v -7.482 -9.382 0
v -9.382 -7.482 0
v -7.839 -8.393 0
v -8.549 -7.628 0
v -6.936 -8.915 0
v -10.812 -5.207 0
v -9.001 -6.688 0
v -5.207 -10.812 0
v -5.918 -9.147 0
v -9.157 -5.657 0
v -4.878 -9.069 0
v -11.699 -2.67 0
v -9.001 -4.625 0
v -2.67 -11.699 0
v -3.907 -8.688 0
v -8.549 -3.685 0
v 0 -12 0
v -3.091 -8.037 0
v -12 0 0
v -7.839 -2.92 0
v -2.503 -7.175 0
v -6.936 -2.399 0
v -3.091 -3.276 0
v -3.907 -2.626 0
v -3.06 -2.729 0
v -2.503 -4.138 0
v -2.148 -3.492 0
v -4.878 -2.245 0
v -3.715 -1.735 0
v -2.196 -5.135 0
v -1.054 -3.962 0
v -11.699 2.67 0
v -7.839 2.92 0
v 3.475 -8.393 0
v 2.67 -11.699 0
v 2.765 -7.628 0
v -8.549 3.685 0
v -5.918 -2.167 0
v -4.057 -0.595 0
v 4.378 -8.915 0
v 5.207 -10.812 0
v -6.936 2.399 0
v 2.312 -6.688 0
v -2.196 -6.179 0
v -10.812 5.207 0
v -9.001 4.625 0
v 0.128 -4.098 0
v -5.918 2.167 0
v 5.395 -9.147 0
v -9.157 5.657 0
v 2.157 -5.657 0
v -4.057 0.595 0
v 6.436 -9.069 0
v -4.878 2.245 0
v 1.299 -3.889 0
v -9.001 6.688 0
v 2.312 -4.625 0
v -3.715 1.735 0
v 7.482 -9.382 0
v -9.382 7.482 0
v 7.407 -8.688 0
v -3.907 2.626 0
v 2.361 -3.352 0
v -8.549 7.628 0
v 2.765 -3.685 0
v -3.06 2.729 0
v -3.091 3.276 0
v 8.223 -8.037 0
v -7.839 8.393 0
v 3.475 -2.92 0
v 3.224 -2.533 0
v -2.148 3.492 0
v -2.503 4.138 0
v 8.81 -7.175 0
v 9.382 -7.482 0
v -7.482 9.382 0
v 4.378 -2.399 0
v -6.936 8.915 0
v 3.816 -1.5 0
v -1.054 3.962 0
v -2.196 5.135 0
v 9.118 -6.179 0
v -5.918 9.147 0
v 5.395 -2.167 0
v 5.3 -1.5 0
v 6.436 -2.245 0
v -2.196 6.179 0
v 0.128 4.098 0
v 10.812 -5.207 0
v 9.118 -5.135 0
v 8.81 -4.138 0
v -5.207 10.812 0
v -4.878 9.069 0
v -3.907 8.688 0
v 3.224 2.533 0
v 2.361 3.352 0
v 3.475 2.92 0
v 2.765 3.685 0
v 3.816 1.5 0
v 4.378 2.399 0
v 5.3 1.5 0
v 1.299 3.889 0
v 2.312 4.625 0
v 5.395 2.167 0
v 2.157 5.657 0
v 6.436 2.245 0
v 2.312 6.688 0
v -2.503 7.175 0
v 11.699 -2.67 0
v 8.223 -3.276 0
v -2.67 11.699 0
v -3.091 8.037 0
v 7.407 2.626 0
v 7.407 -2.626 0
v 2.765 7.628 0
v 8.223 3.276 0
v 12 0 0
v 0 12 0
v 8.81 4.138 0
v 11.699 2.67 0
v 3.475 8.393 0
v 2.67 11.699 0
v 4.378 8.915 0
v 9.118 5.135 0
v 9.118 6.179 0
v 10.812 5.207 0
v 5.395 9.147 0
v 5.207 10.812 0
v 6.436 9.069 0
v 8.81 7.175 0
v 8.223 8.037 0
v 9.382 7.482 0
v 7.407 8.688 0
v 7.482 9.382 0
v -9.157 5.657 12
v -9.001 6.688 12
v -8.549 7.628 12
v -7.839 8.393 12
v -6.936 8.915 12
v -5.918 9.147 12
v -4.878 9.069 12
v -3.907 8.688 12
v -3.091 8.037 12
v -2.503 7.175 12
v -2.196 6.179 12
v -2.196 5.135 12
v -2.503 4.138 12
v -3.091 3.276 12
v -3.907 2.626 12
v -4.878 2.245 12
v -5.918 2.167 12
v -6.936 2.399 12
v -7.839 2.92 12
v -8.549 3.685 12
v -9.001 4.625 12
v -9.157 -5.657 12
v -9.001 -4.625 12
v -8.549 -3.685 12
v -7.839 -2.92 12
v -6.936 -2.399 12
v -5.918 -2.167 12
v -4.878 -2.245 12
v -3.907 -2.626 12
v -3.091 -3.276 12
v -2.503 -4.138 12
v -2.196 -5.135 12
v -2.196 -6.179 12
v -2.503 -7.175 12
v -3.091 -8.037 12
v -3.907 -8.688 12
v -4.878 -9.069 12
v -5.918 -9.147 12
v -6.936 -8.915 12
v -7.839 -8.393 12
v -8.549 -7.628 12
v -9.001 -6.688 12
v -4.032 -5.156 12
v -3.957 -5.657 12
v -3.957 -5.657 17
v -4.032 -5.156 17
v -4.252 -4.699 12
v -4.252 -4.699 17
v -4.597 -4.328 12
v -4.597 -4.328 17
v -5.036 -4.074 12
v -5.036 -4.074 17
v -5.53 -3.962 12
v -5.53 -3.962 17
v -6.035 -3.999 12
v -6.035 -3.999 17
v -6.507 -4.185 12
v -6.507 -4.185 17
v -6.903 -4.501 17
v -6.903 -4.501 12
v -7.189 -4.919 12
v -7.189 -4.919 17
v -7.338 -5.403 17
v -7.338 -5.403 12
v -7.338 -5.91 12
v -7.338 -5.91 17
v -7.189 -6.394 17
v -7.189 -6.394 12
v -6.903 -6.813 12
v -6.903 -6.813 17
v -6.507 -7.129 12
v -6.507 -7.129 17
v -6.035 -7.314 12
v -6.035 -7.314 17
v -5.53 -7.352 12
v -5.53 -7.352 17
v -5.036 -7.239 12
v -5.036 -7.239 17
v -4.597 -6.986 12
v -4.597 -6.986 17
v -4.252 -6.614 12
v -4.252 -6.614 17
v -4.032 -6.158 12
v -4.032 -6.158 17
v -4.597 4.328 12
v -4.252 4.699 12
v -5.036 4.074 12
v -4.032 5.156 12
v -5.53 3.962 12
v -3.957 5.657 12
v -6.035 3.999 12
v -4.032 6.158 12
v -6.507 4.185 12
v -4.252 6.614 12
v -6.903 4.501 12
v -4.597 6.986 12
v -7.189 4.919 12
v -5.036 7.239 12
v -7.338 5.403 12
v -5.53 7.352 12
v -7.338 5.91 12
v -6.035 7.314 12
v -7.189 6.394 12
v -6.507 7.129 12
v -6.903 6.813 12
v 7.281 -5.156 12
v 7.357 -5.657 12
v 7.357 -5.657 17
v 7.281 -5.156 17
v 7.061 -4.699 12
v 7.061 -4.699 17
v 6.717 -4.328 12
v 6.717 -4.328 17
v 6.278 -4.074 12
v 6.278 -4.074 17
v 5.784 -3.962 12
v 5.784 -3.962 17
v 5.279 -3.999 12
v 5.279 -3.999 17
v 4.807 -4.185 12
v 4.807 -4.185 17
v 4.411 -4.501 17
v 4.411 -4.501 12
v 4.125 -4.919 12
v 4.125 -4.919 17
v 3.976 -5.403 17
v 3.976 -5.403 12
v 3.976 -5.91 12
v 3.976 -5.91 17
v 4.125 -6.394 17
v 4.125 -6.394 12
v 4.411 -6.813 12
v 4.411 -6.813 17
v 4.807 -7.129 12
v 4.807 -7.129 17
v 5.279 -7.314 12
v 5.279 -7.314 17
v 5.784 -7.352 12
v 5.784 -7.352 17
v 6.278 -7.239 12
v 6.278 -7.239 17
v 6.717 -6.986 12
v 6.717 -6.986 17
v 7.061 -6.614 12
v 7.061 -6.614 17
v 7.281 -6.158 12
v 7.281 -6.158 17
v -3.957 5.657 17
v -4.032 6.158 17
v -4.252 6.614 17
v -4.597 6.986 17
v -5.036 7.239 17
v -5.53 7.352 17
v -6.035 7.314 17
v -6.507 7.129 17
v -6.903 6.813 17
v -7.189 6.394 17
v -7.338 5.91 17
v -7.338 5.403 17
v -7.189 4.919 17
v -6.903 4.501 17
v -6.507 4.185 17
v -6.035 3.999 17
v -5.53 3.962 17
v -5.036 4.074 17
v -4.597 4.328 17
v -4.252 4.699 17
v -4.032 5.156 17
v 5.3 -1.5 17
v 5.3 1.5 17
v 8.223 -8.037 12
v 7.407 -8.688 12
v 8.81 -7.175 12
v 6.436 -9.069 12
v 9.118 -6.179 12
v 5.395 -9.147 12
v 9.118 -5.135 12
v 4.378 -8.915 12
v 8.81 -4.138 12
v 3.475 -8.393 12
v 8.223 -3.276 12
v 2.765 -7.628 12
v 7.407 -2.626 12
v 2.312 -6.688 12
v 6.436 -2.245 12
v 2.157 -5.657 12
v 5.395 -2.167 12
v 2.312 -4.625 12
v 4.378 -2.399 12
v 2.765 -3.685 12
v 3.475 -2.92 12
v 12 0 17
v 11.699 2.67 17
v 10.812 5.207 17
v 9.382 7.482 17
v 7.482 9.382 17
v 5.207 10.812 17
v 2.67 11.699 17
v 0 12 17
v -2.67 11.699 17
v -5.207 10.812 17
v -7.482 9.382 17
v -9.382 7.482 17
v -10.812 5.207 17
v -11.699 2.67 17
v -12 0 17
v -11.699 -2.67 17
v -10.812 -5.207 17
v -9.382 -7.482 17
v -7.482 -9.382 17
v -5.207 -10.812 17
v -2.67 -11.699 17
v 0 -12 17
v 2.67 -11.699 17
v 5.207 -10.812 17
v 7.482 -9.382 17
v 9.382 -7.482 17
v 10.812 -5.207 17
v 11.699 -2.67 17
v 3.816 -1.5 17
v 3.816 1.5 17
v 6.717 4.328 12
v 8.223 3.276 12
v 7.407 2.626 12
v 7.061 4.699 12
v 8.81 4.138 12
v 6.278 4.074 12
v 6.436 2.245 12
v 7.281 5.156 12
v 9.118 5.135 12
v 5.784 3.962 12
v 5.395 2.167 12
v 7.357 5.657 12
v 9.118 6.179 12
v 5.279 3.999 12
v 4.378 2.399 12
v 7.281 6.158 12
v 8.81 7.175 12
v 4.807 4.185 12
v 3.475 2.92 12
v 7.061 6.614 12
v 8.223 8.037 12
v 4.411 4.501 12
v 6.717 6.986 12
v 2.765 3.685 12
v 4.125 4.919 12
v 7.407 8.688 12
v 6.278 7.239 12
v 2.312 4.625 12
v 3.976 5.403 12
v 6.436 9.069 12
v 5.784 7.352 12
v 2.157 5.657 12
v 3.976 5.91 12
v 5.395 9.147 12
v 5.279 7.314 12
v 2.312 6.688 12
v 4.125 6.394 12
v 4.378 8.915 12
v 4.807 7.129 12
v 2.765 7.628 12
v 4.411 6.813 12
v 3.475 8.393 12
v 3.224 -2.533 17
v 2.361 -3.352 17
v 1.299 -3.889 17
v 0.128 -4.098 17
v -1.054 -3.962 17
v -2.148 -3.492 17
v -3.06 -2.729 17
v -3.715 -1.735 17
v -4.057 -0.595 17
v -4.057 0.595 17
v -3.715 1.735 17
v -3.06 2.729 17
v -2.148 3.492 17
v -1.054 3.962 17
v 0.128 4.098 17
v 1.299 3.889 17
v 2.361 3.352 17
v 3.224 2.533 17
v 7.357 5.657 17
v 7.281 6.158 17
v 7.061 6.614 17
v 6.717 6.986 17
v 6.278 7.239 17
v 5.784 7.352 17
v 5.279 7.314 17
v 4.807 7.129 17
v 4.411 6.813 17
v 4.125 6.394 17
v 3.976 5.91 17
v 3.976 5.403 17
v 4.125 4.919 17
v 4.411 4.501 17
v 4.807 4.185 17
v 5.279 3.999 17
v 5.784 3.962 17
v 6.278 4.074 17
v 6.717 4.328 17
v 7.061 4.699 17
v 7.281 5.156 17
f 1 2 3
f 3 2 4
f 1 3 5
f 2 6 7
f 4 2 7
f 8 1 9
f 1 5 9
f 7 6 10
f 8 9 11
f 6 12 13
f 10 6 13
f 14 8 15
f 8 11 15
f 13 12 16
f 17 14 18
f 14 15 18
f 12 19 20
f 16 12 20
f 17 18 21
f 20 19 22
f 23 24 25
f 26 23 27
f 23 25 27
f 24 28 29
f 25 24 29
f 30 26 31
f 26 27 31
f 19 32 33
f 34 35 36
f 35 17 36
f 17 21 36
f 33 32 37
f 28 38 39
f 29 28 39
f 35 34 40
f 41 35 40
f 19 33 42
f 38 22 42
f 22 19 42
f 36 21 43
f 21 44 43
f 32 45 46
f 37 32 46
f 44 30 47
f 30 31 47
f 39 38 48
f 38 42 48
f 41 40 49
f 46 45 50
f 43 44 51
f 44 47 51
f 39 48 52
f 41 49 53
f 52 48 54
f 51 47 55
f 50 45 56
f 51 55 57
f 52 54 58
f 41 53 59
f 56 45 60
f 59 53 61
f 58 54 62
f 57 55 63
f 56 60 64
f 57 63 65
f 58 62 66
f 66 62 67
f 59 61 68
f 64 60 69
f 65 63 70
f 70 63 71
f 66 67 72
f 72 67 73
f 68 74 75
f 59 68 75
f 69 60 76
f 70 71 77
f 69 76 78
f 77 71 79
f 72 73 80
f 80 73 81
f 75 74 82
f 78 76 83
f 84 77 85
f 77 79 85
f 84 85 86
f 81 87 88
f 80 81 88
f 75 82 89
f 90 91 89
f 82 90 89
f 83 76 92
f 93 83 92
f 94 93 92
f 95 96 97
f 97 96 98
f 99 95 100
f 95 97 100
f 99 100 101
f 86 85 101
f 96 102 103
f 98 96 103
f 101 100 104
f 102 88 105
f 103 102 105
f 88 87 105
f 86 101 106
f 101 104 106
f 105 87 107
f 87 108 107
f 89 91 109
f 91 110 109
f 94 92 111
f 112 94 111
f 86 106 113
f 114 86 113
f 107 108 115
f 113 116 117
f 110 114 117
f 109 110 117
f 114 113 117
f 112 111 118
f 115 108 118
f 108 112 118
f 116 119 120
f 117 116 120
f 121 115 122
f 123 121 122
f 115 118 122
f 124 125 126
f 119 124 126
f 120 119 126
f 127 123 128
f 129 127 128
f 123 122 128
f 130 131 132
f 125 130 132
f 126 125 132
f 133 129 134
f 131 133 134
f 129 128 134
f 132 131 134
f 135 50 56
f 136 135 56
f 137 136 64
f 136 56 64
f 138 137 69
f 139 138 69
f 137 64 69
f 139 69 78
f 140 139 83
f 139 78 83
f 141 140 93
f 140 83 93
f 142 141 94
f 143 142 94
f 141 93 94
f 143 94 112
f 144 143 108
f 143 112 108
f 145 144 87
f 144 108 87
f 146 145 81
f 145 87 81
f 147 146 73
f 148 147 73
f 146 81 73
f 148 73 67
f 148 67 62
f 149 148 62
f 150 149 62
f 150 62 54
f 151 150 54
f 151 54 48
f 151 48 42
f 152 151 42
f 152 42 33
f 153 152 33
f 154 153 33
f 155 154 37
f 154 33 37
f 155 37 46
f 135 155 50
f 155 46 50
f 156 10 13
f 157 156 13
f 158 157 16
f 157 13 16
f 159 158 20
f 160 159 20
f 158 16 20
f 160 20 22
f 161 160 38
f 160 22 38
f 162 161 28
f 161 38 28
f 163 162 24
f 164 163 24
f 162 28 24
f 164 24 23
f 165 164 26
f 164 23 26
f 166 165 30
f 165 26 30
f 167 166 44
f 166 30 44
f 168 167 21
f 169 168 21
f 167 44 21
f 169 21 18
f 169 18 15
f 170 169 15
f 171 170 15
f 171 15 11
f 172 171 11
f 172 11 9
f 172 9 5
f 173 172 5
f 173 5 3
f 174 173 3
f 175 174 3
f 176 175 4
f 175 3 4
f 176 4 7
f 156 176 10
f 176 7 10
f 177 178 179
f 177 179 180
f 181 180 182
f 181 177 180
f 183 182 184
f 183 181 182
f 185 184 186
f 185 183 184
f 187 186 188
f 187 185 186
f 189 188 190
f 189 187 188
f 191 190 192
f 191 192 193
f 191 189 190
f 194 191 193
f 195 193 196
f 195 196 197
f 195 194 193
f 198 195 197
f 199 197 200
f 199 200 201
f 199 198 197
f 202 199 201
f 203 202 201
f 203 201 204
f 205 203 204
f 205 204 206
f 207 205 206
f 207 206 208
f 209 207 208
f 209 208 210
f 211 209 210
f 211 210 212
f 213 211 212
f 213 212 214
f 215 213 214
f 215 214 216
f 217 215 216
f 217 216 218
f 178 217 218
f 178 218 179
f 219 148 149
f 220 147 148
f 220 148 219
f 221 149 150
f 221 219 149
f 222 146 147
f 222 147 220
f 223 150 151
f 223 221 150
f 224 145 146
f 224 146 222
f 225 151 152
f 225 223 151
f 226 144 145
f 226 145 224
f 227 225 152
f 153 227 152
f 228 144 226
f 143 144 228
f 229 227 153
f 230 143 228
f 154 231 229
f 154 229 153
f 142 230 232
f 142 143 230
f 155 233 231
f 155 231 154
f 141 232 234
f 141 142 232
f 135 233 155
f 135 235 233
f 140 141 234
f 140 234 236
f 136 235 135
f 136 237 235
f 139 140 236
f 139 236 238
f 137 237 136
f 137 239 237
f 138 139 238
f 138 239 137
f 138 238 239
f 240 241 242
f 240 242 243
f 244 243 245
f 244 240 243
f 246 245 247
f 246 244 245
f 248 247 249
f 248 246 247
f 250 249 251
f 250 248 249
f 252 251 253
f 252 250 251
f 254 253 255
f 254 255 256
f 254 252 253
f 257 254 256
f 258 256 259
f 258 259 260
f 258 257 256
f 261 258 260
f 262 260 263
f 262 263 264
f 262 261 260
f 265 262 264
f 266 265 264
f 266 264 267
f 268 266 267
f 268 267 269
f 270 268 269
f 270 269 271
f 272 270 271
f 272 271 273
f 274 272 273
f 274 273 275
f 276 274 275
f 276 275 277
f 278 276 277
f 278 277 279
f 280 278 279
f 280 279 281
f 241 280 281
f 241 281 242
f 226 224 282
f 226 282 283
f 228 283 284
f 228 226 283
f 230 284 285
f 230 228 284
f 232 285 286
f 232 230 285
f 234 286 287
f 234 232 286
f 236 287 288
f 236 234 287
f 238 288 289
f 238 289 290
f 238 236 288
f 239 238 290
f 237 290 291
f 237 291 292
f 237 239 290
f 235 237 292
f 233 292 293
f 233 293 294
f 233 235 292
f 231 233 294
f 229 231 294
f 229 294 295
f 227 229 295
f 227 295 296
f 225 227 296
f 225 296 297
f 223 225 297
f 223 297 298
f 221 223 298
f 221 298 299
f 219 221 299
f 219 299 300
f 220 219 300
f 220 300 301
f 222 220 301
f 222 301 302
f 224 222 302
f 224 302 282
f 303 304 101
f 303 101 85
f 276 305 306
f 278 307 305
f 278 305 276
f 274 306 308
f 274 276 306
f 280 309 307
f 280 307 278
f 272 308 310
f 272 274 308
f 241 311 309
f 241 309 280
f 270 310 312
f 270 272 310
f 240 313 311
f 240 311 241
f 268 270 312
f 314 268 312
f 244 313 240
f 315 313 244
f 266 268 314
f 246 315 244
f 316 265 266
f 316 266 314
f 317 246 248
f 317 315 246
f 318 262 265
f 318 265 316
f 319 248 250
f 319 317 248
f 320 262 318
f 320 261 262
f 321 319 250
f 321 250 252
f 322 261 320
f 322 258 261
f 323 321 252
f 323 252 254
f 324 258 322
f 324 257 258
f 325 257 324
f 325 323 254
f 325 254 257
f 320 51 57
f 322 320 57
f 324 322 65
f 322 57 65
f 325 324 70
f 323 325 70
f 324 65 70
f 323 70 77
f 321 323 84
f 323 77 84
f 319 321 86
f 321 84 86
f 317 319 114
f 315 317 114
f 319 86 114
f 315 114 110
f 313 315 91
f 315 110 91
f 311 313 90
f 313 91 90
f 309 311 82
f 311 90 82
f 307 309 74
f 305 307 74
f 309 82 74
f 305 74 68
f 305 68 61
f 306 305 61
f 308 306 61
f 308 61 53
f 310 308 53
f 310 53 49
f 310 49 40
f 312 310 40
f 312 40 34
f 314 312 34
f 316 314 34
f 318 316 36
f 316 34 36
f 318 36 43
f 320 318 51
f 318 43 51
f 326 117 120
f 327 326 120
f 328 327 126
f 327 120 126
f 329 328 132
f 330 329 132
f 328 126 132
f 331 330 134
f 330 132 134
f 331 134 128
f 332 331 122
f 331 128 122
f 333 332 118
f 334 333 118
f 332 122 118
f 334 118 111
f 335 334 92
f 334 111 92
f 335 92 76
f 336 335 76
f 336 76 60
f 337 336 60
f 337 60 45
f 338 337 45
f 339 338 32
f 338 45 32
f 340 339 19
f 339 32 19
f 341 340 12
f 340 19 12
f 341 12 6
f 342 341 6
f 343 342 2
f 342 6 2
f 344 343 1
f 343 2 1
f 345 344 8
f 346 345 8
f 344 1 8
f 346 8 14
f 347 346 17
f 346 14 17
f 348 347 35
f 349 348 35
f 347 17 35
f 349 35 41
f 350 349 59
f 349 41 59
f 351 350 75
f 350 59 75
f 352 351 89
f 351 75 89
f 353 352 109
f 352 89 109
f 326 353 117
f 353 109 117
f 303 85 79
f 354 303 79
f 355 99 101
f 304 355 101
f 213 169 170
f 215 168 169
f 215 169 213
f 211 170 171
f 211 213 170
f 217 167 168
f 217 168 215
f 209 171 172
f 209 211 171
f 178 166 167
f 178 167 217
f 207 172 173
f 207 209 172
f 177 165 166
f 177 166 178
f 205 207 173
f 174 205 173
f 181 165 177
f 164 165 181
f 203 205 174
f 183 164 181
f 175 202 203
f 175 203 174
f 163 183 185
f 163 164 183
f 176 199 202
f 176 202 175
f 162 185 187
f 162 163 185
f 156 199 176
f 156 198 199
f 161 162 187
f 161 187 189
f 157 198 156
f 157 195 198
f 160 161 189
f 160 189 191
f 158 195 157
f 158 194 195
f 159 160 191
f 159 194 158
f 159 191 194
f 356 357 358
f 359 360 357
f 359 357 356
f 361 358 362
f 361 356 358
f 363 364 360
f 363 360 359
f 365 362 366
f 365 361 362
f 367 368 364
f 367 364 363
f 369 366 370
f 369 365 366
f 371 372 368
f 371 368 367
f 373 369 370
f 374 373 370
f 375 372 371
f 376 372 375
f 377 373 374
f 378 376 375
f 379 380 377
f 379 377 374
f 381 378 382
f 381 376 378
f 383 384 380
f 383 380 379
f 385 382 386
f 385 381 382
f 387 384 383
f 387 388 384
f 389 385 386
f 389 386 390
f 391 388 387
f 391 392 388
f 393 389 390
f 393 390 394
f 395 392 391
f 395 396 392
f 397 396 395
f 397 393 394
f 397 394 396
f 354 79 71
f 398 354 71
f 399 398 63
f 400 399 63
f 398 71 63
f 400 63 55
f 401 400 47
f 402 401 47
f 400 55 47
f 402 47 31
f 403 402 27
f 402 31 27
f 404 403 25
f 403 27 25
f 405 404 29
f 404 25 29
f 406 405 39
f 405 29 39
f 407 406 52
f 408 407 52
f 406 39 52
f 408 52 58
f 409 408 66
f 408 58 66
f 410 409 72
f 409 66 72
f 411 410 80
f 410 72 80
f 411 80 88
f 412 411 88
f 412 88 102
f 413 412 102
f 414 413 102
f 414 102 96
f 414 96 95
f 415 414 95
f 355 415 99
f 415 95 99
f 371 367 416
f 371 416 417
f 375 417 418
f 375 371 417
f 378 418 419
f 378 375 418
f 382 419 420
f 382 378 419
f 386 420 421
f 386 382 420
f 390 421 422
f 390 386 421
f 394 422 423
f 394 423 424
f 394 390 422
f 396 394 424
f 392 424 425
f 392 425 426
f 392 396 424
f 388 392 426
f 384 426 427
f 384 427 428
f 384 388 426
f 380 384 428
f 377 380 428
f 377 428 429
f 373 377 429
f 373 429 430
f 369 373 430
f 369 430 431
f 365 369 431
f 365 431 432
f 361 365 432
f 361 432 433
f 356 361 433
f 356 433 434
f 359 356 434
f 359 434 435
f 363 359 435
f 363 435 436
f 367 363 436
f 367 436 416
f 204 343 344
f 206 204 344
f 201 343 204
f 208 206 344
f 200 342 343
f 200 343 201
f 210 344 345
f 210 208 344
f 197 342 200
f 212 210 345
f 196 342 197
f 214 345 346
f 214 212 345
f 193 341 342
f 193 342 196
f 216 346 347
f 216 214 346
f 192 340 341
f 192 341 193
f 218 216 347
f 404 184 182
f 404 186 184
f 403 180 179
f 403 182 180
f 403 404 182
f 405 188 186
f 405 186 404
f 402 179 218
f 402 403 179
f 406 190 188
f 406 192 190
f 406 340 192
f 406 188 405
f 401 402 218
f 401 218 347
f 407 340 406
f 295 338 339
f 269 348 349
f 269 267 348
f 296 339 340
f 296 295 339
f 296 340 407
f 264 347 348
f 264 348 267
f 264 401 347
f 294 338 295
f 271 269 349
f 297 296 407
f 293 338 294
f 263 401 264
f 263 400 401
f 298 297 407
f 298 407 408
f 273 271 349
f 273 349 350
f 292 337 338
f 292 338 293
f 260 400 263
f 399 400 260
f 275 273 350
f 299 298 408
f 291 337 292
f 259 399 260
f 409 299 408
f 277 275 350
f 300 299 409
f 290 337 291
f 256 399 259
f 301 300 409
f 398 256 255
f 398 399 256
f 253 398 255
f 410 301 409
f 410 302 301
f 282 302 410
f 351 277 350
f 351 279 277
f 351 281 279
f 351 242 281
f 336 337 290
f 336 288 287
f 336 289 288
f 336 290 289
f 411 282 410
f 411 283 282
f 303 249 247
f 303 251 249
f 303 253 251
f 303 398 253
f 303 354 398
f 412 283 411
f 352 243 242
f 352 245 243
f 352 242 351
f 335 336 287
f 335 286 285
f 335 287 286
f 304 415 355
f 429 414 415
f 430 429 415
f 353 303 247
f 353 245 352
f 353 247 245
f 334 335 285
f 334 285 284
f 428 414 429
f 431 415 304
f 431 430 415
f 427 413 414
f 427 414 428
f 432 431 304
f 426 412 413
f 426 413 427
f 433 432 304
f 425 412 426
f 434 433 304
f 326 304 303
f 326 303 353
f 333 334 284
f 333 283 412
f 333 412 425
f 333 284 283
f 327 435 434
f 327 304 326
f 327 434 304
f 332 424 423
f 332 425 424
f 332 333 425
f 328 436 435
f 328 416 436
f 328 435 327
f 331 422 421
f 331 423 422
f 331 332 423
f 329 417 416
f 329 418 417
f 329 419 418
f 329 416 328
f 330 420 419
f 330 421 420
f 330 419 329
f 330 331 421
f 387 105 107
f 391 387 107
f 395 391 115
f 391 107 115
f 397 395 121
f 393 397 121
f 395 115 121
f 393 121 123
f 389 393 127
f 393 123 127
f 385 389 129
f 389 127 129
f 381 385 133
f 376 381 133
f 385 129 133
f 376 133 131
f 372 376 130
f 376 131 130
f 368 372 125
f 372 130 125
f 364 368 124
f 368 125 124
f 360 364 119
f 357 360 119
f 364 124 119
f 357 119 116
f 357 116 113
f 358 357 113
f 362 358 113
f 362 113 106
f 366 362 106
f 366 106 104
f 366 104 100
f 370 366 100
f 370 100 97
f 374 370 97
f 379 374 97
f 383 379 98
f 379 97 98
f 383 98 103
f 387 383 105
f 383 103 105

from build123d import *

# Parameters (mm, degrees)
SKIZZE1_R                       = 12
SKIZZE1_R_2                     = 1.7
AUFSATZ_LINEAR_AUSTRAGEN1_DEPTH = 17
SKIZZE3_R                       = 3.5
SCHNITT_LINEAR_AUSTRAGEN1_DEPTH = 12


with BuildPart() as part:
    # Skizze1 → Aufsatz-Linear austragen1 (new body)
    with BuildSketch(Plane.XY):
        Circle(SKIZZE1_R)
        with Locations((5.656854249, 5.656854249)):
            Circle(SKIZZE1_R_2, mode=Mode.SUBTRACT)
        with Locations((-5.656854249, 5.656854249)):
            Circle(SKIZZE1_R_2, mode=Mode.SUBTRACT)
        with Locations((-5.656854249, -5.656854249)):
            Circle(SKIZZE1_R_2, mode=Mode.SUBTRACT)
        with Locations((5.656854249, -5.656854249)):
            Circle(SKIZZE1_R_2, mode=Mode.SUBTRACT)
        with BuildLine():
            ThreePointArc((3.815756806, -1.5), (-4.1, 0), (3.815756806, 1.5))
            Line((3.815756806, 1.5), (5.3, 1.5))
            Line((5.3, 1.5), (5.3, -1.5))
            Line((5.3, -1.5), (3.815756806, -1.5))
        make_face(mode=Mode.SUBTRACT)
    extrude(amount=AUFSATZ_LINEAR_AUSTRAGEN1_DEPTH)

    # Skizze3 → Schnitt-Linear austragen1 (cut)
    with BuildSketch(Plane(origin=(0, 0, 0), x_dir=(-1, 0, 0), z_dir=(0, 0, -1))):
        with Locations((-5.656854249, 5.656854249)):
            Circle(SKIZZE3_R)
        with Locations((5.656854249, 5.656854249)):
            Circle(SKIZZE3_R)
        with Locations((5.656854249, -5.656854249)):
            Circle(SKIZZE3_R)
        with Locations((-5.656854249, -5.656854249)):
            Circle(SKIZZE3_R)
    extrude(amount=-SCHNITT_LINEAR_AUSTRAGEN1_DEPTH, mode=Mode.SUBTRACT)


solid = part.part
